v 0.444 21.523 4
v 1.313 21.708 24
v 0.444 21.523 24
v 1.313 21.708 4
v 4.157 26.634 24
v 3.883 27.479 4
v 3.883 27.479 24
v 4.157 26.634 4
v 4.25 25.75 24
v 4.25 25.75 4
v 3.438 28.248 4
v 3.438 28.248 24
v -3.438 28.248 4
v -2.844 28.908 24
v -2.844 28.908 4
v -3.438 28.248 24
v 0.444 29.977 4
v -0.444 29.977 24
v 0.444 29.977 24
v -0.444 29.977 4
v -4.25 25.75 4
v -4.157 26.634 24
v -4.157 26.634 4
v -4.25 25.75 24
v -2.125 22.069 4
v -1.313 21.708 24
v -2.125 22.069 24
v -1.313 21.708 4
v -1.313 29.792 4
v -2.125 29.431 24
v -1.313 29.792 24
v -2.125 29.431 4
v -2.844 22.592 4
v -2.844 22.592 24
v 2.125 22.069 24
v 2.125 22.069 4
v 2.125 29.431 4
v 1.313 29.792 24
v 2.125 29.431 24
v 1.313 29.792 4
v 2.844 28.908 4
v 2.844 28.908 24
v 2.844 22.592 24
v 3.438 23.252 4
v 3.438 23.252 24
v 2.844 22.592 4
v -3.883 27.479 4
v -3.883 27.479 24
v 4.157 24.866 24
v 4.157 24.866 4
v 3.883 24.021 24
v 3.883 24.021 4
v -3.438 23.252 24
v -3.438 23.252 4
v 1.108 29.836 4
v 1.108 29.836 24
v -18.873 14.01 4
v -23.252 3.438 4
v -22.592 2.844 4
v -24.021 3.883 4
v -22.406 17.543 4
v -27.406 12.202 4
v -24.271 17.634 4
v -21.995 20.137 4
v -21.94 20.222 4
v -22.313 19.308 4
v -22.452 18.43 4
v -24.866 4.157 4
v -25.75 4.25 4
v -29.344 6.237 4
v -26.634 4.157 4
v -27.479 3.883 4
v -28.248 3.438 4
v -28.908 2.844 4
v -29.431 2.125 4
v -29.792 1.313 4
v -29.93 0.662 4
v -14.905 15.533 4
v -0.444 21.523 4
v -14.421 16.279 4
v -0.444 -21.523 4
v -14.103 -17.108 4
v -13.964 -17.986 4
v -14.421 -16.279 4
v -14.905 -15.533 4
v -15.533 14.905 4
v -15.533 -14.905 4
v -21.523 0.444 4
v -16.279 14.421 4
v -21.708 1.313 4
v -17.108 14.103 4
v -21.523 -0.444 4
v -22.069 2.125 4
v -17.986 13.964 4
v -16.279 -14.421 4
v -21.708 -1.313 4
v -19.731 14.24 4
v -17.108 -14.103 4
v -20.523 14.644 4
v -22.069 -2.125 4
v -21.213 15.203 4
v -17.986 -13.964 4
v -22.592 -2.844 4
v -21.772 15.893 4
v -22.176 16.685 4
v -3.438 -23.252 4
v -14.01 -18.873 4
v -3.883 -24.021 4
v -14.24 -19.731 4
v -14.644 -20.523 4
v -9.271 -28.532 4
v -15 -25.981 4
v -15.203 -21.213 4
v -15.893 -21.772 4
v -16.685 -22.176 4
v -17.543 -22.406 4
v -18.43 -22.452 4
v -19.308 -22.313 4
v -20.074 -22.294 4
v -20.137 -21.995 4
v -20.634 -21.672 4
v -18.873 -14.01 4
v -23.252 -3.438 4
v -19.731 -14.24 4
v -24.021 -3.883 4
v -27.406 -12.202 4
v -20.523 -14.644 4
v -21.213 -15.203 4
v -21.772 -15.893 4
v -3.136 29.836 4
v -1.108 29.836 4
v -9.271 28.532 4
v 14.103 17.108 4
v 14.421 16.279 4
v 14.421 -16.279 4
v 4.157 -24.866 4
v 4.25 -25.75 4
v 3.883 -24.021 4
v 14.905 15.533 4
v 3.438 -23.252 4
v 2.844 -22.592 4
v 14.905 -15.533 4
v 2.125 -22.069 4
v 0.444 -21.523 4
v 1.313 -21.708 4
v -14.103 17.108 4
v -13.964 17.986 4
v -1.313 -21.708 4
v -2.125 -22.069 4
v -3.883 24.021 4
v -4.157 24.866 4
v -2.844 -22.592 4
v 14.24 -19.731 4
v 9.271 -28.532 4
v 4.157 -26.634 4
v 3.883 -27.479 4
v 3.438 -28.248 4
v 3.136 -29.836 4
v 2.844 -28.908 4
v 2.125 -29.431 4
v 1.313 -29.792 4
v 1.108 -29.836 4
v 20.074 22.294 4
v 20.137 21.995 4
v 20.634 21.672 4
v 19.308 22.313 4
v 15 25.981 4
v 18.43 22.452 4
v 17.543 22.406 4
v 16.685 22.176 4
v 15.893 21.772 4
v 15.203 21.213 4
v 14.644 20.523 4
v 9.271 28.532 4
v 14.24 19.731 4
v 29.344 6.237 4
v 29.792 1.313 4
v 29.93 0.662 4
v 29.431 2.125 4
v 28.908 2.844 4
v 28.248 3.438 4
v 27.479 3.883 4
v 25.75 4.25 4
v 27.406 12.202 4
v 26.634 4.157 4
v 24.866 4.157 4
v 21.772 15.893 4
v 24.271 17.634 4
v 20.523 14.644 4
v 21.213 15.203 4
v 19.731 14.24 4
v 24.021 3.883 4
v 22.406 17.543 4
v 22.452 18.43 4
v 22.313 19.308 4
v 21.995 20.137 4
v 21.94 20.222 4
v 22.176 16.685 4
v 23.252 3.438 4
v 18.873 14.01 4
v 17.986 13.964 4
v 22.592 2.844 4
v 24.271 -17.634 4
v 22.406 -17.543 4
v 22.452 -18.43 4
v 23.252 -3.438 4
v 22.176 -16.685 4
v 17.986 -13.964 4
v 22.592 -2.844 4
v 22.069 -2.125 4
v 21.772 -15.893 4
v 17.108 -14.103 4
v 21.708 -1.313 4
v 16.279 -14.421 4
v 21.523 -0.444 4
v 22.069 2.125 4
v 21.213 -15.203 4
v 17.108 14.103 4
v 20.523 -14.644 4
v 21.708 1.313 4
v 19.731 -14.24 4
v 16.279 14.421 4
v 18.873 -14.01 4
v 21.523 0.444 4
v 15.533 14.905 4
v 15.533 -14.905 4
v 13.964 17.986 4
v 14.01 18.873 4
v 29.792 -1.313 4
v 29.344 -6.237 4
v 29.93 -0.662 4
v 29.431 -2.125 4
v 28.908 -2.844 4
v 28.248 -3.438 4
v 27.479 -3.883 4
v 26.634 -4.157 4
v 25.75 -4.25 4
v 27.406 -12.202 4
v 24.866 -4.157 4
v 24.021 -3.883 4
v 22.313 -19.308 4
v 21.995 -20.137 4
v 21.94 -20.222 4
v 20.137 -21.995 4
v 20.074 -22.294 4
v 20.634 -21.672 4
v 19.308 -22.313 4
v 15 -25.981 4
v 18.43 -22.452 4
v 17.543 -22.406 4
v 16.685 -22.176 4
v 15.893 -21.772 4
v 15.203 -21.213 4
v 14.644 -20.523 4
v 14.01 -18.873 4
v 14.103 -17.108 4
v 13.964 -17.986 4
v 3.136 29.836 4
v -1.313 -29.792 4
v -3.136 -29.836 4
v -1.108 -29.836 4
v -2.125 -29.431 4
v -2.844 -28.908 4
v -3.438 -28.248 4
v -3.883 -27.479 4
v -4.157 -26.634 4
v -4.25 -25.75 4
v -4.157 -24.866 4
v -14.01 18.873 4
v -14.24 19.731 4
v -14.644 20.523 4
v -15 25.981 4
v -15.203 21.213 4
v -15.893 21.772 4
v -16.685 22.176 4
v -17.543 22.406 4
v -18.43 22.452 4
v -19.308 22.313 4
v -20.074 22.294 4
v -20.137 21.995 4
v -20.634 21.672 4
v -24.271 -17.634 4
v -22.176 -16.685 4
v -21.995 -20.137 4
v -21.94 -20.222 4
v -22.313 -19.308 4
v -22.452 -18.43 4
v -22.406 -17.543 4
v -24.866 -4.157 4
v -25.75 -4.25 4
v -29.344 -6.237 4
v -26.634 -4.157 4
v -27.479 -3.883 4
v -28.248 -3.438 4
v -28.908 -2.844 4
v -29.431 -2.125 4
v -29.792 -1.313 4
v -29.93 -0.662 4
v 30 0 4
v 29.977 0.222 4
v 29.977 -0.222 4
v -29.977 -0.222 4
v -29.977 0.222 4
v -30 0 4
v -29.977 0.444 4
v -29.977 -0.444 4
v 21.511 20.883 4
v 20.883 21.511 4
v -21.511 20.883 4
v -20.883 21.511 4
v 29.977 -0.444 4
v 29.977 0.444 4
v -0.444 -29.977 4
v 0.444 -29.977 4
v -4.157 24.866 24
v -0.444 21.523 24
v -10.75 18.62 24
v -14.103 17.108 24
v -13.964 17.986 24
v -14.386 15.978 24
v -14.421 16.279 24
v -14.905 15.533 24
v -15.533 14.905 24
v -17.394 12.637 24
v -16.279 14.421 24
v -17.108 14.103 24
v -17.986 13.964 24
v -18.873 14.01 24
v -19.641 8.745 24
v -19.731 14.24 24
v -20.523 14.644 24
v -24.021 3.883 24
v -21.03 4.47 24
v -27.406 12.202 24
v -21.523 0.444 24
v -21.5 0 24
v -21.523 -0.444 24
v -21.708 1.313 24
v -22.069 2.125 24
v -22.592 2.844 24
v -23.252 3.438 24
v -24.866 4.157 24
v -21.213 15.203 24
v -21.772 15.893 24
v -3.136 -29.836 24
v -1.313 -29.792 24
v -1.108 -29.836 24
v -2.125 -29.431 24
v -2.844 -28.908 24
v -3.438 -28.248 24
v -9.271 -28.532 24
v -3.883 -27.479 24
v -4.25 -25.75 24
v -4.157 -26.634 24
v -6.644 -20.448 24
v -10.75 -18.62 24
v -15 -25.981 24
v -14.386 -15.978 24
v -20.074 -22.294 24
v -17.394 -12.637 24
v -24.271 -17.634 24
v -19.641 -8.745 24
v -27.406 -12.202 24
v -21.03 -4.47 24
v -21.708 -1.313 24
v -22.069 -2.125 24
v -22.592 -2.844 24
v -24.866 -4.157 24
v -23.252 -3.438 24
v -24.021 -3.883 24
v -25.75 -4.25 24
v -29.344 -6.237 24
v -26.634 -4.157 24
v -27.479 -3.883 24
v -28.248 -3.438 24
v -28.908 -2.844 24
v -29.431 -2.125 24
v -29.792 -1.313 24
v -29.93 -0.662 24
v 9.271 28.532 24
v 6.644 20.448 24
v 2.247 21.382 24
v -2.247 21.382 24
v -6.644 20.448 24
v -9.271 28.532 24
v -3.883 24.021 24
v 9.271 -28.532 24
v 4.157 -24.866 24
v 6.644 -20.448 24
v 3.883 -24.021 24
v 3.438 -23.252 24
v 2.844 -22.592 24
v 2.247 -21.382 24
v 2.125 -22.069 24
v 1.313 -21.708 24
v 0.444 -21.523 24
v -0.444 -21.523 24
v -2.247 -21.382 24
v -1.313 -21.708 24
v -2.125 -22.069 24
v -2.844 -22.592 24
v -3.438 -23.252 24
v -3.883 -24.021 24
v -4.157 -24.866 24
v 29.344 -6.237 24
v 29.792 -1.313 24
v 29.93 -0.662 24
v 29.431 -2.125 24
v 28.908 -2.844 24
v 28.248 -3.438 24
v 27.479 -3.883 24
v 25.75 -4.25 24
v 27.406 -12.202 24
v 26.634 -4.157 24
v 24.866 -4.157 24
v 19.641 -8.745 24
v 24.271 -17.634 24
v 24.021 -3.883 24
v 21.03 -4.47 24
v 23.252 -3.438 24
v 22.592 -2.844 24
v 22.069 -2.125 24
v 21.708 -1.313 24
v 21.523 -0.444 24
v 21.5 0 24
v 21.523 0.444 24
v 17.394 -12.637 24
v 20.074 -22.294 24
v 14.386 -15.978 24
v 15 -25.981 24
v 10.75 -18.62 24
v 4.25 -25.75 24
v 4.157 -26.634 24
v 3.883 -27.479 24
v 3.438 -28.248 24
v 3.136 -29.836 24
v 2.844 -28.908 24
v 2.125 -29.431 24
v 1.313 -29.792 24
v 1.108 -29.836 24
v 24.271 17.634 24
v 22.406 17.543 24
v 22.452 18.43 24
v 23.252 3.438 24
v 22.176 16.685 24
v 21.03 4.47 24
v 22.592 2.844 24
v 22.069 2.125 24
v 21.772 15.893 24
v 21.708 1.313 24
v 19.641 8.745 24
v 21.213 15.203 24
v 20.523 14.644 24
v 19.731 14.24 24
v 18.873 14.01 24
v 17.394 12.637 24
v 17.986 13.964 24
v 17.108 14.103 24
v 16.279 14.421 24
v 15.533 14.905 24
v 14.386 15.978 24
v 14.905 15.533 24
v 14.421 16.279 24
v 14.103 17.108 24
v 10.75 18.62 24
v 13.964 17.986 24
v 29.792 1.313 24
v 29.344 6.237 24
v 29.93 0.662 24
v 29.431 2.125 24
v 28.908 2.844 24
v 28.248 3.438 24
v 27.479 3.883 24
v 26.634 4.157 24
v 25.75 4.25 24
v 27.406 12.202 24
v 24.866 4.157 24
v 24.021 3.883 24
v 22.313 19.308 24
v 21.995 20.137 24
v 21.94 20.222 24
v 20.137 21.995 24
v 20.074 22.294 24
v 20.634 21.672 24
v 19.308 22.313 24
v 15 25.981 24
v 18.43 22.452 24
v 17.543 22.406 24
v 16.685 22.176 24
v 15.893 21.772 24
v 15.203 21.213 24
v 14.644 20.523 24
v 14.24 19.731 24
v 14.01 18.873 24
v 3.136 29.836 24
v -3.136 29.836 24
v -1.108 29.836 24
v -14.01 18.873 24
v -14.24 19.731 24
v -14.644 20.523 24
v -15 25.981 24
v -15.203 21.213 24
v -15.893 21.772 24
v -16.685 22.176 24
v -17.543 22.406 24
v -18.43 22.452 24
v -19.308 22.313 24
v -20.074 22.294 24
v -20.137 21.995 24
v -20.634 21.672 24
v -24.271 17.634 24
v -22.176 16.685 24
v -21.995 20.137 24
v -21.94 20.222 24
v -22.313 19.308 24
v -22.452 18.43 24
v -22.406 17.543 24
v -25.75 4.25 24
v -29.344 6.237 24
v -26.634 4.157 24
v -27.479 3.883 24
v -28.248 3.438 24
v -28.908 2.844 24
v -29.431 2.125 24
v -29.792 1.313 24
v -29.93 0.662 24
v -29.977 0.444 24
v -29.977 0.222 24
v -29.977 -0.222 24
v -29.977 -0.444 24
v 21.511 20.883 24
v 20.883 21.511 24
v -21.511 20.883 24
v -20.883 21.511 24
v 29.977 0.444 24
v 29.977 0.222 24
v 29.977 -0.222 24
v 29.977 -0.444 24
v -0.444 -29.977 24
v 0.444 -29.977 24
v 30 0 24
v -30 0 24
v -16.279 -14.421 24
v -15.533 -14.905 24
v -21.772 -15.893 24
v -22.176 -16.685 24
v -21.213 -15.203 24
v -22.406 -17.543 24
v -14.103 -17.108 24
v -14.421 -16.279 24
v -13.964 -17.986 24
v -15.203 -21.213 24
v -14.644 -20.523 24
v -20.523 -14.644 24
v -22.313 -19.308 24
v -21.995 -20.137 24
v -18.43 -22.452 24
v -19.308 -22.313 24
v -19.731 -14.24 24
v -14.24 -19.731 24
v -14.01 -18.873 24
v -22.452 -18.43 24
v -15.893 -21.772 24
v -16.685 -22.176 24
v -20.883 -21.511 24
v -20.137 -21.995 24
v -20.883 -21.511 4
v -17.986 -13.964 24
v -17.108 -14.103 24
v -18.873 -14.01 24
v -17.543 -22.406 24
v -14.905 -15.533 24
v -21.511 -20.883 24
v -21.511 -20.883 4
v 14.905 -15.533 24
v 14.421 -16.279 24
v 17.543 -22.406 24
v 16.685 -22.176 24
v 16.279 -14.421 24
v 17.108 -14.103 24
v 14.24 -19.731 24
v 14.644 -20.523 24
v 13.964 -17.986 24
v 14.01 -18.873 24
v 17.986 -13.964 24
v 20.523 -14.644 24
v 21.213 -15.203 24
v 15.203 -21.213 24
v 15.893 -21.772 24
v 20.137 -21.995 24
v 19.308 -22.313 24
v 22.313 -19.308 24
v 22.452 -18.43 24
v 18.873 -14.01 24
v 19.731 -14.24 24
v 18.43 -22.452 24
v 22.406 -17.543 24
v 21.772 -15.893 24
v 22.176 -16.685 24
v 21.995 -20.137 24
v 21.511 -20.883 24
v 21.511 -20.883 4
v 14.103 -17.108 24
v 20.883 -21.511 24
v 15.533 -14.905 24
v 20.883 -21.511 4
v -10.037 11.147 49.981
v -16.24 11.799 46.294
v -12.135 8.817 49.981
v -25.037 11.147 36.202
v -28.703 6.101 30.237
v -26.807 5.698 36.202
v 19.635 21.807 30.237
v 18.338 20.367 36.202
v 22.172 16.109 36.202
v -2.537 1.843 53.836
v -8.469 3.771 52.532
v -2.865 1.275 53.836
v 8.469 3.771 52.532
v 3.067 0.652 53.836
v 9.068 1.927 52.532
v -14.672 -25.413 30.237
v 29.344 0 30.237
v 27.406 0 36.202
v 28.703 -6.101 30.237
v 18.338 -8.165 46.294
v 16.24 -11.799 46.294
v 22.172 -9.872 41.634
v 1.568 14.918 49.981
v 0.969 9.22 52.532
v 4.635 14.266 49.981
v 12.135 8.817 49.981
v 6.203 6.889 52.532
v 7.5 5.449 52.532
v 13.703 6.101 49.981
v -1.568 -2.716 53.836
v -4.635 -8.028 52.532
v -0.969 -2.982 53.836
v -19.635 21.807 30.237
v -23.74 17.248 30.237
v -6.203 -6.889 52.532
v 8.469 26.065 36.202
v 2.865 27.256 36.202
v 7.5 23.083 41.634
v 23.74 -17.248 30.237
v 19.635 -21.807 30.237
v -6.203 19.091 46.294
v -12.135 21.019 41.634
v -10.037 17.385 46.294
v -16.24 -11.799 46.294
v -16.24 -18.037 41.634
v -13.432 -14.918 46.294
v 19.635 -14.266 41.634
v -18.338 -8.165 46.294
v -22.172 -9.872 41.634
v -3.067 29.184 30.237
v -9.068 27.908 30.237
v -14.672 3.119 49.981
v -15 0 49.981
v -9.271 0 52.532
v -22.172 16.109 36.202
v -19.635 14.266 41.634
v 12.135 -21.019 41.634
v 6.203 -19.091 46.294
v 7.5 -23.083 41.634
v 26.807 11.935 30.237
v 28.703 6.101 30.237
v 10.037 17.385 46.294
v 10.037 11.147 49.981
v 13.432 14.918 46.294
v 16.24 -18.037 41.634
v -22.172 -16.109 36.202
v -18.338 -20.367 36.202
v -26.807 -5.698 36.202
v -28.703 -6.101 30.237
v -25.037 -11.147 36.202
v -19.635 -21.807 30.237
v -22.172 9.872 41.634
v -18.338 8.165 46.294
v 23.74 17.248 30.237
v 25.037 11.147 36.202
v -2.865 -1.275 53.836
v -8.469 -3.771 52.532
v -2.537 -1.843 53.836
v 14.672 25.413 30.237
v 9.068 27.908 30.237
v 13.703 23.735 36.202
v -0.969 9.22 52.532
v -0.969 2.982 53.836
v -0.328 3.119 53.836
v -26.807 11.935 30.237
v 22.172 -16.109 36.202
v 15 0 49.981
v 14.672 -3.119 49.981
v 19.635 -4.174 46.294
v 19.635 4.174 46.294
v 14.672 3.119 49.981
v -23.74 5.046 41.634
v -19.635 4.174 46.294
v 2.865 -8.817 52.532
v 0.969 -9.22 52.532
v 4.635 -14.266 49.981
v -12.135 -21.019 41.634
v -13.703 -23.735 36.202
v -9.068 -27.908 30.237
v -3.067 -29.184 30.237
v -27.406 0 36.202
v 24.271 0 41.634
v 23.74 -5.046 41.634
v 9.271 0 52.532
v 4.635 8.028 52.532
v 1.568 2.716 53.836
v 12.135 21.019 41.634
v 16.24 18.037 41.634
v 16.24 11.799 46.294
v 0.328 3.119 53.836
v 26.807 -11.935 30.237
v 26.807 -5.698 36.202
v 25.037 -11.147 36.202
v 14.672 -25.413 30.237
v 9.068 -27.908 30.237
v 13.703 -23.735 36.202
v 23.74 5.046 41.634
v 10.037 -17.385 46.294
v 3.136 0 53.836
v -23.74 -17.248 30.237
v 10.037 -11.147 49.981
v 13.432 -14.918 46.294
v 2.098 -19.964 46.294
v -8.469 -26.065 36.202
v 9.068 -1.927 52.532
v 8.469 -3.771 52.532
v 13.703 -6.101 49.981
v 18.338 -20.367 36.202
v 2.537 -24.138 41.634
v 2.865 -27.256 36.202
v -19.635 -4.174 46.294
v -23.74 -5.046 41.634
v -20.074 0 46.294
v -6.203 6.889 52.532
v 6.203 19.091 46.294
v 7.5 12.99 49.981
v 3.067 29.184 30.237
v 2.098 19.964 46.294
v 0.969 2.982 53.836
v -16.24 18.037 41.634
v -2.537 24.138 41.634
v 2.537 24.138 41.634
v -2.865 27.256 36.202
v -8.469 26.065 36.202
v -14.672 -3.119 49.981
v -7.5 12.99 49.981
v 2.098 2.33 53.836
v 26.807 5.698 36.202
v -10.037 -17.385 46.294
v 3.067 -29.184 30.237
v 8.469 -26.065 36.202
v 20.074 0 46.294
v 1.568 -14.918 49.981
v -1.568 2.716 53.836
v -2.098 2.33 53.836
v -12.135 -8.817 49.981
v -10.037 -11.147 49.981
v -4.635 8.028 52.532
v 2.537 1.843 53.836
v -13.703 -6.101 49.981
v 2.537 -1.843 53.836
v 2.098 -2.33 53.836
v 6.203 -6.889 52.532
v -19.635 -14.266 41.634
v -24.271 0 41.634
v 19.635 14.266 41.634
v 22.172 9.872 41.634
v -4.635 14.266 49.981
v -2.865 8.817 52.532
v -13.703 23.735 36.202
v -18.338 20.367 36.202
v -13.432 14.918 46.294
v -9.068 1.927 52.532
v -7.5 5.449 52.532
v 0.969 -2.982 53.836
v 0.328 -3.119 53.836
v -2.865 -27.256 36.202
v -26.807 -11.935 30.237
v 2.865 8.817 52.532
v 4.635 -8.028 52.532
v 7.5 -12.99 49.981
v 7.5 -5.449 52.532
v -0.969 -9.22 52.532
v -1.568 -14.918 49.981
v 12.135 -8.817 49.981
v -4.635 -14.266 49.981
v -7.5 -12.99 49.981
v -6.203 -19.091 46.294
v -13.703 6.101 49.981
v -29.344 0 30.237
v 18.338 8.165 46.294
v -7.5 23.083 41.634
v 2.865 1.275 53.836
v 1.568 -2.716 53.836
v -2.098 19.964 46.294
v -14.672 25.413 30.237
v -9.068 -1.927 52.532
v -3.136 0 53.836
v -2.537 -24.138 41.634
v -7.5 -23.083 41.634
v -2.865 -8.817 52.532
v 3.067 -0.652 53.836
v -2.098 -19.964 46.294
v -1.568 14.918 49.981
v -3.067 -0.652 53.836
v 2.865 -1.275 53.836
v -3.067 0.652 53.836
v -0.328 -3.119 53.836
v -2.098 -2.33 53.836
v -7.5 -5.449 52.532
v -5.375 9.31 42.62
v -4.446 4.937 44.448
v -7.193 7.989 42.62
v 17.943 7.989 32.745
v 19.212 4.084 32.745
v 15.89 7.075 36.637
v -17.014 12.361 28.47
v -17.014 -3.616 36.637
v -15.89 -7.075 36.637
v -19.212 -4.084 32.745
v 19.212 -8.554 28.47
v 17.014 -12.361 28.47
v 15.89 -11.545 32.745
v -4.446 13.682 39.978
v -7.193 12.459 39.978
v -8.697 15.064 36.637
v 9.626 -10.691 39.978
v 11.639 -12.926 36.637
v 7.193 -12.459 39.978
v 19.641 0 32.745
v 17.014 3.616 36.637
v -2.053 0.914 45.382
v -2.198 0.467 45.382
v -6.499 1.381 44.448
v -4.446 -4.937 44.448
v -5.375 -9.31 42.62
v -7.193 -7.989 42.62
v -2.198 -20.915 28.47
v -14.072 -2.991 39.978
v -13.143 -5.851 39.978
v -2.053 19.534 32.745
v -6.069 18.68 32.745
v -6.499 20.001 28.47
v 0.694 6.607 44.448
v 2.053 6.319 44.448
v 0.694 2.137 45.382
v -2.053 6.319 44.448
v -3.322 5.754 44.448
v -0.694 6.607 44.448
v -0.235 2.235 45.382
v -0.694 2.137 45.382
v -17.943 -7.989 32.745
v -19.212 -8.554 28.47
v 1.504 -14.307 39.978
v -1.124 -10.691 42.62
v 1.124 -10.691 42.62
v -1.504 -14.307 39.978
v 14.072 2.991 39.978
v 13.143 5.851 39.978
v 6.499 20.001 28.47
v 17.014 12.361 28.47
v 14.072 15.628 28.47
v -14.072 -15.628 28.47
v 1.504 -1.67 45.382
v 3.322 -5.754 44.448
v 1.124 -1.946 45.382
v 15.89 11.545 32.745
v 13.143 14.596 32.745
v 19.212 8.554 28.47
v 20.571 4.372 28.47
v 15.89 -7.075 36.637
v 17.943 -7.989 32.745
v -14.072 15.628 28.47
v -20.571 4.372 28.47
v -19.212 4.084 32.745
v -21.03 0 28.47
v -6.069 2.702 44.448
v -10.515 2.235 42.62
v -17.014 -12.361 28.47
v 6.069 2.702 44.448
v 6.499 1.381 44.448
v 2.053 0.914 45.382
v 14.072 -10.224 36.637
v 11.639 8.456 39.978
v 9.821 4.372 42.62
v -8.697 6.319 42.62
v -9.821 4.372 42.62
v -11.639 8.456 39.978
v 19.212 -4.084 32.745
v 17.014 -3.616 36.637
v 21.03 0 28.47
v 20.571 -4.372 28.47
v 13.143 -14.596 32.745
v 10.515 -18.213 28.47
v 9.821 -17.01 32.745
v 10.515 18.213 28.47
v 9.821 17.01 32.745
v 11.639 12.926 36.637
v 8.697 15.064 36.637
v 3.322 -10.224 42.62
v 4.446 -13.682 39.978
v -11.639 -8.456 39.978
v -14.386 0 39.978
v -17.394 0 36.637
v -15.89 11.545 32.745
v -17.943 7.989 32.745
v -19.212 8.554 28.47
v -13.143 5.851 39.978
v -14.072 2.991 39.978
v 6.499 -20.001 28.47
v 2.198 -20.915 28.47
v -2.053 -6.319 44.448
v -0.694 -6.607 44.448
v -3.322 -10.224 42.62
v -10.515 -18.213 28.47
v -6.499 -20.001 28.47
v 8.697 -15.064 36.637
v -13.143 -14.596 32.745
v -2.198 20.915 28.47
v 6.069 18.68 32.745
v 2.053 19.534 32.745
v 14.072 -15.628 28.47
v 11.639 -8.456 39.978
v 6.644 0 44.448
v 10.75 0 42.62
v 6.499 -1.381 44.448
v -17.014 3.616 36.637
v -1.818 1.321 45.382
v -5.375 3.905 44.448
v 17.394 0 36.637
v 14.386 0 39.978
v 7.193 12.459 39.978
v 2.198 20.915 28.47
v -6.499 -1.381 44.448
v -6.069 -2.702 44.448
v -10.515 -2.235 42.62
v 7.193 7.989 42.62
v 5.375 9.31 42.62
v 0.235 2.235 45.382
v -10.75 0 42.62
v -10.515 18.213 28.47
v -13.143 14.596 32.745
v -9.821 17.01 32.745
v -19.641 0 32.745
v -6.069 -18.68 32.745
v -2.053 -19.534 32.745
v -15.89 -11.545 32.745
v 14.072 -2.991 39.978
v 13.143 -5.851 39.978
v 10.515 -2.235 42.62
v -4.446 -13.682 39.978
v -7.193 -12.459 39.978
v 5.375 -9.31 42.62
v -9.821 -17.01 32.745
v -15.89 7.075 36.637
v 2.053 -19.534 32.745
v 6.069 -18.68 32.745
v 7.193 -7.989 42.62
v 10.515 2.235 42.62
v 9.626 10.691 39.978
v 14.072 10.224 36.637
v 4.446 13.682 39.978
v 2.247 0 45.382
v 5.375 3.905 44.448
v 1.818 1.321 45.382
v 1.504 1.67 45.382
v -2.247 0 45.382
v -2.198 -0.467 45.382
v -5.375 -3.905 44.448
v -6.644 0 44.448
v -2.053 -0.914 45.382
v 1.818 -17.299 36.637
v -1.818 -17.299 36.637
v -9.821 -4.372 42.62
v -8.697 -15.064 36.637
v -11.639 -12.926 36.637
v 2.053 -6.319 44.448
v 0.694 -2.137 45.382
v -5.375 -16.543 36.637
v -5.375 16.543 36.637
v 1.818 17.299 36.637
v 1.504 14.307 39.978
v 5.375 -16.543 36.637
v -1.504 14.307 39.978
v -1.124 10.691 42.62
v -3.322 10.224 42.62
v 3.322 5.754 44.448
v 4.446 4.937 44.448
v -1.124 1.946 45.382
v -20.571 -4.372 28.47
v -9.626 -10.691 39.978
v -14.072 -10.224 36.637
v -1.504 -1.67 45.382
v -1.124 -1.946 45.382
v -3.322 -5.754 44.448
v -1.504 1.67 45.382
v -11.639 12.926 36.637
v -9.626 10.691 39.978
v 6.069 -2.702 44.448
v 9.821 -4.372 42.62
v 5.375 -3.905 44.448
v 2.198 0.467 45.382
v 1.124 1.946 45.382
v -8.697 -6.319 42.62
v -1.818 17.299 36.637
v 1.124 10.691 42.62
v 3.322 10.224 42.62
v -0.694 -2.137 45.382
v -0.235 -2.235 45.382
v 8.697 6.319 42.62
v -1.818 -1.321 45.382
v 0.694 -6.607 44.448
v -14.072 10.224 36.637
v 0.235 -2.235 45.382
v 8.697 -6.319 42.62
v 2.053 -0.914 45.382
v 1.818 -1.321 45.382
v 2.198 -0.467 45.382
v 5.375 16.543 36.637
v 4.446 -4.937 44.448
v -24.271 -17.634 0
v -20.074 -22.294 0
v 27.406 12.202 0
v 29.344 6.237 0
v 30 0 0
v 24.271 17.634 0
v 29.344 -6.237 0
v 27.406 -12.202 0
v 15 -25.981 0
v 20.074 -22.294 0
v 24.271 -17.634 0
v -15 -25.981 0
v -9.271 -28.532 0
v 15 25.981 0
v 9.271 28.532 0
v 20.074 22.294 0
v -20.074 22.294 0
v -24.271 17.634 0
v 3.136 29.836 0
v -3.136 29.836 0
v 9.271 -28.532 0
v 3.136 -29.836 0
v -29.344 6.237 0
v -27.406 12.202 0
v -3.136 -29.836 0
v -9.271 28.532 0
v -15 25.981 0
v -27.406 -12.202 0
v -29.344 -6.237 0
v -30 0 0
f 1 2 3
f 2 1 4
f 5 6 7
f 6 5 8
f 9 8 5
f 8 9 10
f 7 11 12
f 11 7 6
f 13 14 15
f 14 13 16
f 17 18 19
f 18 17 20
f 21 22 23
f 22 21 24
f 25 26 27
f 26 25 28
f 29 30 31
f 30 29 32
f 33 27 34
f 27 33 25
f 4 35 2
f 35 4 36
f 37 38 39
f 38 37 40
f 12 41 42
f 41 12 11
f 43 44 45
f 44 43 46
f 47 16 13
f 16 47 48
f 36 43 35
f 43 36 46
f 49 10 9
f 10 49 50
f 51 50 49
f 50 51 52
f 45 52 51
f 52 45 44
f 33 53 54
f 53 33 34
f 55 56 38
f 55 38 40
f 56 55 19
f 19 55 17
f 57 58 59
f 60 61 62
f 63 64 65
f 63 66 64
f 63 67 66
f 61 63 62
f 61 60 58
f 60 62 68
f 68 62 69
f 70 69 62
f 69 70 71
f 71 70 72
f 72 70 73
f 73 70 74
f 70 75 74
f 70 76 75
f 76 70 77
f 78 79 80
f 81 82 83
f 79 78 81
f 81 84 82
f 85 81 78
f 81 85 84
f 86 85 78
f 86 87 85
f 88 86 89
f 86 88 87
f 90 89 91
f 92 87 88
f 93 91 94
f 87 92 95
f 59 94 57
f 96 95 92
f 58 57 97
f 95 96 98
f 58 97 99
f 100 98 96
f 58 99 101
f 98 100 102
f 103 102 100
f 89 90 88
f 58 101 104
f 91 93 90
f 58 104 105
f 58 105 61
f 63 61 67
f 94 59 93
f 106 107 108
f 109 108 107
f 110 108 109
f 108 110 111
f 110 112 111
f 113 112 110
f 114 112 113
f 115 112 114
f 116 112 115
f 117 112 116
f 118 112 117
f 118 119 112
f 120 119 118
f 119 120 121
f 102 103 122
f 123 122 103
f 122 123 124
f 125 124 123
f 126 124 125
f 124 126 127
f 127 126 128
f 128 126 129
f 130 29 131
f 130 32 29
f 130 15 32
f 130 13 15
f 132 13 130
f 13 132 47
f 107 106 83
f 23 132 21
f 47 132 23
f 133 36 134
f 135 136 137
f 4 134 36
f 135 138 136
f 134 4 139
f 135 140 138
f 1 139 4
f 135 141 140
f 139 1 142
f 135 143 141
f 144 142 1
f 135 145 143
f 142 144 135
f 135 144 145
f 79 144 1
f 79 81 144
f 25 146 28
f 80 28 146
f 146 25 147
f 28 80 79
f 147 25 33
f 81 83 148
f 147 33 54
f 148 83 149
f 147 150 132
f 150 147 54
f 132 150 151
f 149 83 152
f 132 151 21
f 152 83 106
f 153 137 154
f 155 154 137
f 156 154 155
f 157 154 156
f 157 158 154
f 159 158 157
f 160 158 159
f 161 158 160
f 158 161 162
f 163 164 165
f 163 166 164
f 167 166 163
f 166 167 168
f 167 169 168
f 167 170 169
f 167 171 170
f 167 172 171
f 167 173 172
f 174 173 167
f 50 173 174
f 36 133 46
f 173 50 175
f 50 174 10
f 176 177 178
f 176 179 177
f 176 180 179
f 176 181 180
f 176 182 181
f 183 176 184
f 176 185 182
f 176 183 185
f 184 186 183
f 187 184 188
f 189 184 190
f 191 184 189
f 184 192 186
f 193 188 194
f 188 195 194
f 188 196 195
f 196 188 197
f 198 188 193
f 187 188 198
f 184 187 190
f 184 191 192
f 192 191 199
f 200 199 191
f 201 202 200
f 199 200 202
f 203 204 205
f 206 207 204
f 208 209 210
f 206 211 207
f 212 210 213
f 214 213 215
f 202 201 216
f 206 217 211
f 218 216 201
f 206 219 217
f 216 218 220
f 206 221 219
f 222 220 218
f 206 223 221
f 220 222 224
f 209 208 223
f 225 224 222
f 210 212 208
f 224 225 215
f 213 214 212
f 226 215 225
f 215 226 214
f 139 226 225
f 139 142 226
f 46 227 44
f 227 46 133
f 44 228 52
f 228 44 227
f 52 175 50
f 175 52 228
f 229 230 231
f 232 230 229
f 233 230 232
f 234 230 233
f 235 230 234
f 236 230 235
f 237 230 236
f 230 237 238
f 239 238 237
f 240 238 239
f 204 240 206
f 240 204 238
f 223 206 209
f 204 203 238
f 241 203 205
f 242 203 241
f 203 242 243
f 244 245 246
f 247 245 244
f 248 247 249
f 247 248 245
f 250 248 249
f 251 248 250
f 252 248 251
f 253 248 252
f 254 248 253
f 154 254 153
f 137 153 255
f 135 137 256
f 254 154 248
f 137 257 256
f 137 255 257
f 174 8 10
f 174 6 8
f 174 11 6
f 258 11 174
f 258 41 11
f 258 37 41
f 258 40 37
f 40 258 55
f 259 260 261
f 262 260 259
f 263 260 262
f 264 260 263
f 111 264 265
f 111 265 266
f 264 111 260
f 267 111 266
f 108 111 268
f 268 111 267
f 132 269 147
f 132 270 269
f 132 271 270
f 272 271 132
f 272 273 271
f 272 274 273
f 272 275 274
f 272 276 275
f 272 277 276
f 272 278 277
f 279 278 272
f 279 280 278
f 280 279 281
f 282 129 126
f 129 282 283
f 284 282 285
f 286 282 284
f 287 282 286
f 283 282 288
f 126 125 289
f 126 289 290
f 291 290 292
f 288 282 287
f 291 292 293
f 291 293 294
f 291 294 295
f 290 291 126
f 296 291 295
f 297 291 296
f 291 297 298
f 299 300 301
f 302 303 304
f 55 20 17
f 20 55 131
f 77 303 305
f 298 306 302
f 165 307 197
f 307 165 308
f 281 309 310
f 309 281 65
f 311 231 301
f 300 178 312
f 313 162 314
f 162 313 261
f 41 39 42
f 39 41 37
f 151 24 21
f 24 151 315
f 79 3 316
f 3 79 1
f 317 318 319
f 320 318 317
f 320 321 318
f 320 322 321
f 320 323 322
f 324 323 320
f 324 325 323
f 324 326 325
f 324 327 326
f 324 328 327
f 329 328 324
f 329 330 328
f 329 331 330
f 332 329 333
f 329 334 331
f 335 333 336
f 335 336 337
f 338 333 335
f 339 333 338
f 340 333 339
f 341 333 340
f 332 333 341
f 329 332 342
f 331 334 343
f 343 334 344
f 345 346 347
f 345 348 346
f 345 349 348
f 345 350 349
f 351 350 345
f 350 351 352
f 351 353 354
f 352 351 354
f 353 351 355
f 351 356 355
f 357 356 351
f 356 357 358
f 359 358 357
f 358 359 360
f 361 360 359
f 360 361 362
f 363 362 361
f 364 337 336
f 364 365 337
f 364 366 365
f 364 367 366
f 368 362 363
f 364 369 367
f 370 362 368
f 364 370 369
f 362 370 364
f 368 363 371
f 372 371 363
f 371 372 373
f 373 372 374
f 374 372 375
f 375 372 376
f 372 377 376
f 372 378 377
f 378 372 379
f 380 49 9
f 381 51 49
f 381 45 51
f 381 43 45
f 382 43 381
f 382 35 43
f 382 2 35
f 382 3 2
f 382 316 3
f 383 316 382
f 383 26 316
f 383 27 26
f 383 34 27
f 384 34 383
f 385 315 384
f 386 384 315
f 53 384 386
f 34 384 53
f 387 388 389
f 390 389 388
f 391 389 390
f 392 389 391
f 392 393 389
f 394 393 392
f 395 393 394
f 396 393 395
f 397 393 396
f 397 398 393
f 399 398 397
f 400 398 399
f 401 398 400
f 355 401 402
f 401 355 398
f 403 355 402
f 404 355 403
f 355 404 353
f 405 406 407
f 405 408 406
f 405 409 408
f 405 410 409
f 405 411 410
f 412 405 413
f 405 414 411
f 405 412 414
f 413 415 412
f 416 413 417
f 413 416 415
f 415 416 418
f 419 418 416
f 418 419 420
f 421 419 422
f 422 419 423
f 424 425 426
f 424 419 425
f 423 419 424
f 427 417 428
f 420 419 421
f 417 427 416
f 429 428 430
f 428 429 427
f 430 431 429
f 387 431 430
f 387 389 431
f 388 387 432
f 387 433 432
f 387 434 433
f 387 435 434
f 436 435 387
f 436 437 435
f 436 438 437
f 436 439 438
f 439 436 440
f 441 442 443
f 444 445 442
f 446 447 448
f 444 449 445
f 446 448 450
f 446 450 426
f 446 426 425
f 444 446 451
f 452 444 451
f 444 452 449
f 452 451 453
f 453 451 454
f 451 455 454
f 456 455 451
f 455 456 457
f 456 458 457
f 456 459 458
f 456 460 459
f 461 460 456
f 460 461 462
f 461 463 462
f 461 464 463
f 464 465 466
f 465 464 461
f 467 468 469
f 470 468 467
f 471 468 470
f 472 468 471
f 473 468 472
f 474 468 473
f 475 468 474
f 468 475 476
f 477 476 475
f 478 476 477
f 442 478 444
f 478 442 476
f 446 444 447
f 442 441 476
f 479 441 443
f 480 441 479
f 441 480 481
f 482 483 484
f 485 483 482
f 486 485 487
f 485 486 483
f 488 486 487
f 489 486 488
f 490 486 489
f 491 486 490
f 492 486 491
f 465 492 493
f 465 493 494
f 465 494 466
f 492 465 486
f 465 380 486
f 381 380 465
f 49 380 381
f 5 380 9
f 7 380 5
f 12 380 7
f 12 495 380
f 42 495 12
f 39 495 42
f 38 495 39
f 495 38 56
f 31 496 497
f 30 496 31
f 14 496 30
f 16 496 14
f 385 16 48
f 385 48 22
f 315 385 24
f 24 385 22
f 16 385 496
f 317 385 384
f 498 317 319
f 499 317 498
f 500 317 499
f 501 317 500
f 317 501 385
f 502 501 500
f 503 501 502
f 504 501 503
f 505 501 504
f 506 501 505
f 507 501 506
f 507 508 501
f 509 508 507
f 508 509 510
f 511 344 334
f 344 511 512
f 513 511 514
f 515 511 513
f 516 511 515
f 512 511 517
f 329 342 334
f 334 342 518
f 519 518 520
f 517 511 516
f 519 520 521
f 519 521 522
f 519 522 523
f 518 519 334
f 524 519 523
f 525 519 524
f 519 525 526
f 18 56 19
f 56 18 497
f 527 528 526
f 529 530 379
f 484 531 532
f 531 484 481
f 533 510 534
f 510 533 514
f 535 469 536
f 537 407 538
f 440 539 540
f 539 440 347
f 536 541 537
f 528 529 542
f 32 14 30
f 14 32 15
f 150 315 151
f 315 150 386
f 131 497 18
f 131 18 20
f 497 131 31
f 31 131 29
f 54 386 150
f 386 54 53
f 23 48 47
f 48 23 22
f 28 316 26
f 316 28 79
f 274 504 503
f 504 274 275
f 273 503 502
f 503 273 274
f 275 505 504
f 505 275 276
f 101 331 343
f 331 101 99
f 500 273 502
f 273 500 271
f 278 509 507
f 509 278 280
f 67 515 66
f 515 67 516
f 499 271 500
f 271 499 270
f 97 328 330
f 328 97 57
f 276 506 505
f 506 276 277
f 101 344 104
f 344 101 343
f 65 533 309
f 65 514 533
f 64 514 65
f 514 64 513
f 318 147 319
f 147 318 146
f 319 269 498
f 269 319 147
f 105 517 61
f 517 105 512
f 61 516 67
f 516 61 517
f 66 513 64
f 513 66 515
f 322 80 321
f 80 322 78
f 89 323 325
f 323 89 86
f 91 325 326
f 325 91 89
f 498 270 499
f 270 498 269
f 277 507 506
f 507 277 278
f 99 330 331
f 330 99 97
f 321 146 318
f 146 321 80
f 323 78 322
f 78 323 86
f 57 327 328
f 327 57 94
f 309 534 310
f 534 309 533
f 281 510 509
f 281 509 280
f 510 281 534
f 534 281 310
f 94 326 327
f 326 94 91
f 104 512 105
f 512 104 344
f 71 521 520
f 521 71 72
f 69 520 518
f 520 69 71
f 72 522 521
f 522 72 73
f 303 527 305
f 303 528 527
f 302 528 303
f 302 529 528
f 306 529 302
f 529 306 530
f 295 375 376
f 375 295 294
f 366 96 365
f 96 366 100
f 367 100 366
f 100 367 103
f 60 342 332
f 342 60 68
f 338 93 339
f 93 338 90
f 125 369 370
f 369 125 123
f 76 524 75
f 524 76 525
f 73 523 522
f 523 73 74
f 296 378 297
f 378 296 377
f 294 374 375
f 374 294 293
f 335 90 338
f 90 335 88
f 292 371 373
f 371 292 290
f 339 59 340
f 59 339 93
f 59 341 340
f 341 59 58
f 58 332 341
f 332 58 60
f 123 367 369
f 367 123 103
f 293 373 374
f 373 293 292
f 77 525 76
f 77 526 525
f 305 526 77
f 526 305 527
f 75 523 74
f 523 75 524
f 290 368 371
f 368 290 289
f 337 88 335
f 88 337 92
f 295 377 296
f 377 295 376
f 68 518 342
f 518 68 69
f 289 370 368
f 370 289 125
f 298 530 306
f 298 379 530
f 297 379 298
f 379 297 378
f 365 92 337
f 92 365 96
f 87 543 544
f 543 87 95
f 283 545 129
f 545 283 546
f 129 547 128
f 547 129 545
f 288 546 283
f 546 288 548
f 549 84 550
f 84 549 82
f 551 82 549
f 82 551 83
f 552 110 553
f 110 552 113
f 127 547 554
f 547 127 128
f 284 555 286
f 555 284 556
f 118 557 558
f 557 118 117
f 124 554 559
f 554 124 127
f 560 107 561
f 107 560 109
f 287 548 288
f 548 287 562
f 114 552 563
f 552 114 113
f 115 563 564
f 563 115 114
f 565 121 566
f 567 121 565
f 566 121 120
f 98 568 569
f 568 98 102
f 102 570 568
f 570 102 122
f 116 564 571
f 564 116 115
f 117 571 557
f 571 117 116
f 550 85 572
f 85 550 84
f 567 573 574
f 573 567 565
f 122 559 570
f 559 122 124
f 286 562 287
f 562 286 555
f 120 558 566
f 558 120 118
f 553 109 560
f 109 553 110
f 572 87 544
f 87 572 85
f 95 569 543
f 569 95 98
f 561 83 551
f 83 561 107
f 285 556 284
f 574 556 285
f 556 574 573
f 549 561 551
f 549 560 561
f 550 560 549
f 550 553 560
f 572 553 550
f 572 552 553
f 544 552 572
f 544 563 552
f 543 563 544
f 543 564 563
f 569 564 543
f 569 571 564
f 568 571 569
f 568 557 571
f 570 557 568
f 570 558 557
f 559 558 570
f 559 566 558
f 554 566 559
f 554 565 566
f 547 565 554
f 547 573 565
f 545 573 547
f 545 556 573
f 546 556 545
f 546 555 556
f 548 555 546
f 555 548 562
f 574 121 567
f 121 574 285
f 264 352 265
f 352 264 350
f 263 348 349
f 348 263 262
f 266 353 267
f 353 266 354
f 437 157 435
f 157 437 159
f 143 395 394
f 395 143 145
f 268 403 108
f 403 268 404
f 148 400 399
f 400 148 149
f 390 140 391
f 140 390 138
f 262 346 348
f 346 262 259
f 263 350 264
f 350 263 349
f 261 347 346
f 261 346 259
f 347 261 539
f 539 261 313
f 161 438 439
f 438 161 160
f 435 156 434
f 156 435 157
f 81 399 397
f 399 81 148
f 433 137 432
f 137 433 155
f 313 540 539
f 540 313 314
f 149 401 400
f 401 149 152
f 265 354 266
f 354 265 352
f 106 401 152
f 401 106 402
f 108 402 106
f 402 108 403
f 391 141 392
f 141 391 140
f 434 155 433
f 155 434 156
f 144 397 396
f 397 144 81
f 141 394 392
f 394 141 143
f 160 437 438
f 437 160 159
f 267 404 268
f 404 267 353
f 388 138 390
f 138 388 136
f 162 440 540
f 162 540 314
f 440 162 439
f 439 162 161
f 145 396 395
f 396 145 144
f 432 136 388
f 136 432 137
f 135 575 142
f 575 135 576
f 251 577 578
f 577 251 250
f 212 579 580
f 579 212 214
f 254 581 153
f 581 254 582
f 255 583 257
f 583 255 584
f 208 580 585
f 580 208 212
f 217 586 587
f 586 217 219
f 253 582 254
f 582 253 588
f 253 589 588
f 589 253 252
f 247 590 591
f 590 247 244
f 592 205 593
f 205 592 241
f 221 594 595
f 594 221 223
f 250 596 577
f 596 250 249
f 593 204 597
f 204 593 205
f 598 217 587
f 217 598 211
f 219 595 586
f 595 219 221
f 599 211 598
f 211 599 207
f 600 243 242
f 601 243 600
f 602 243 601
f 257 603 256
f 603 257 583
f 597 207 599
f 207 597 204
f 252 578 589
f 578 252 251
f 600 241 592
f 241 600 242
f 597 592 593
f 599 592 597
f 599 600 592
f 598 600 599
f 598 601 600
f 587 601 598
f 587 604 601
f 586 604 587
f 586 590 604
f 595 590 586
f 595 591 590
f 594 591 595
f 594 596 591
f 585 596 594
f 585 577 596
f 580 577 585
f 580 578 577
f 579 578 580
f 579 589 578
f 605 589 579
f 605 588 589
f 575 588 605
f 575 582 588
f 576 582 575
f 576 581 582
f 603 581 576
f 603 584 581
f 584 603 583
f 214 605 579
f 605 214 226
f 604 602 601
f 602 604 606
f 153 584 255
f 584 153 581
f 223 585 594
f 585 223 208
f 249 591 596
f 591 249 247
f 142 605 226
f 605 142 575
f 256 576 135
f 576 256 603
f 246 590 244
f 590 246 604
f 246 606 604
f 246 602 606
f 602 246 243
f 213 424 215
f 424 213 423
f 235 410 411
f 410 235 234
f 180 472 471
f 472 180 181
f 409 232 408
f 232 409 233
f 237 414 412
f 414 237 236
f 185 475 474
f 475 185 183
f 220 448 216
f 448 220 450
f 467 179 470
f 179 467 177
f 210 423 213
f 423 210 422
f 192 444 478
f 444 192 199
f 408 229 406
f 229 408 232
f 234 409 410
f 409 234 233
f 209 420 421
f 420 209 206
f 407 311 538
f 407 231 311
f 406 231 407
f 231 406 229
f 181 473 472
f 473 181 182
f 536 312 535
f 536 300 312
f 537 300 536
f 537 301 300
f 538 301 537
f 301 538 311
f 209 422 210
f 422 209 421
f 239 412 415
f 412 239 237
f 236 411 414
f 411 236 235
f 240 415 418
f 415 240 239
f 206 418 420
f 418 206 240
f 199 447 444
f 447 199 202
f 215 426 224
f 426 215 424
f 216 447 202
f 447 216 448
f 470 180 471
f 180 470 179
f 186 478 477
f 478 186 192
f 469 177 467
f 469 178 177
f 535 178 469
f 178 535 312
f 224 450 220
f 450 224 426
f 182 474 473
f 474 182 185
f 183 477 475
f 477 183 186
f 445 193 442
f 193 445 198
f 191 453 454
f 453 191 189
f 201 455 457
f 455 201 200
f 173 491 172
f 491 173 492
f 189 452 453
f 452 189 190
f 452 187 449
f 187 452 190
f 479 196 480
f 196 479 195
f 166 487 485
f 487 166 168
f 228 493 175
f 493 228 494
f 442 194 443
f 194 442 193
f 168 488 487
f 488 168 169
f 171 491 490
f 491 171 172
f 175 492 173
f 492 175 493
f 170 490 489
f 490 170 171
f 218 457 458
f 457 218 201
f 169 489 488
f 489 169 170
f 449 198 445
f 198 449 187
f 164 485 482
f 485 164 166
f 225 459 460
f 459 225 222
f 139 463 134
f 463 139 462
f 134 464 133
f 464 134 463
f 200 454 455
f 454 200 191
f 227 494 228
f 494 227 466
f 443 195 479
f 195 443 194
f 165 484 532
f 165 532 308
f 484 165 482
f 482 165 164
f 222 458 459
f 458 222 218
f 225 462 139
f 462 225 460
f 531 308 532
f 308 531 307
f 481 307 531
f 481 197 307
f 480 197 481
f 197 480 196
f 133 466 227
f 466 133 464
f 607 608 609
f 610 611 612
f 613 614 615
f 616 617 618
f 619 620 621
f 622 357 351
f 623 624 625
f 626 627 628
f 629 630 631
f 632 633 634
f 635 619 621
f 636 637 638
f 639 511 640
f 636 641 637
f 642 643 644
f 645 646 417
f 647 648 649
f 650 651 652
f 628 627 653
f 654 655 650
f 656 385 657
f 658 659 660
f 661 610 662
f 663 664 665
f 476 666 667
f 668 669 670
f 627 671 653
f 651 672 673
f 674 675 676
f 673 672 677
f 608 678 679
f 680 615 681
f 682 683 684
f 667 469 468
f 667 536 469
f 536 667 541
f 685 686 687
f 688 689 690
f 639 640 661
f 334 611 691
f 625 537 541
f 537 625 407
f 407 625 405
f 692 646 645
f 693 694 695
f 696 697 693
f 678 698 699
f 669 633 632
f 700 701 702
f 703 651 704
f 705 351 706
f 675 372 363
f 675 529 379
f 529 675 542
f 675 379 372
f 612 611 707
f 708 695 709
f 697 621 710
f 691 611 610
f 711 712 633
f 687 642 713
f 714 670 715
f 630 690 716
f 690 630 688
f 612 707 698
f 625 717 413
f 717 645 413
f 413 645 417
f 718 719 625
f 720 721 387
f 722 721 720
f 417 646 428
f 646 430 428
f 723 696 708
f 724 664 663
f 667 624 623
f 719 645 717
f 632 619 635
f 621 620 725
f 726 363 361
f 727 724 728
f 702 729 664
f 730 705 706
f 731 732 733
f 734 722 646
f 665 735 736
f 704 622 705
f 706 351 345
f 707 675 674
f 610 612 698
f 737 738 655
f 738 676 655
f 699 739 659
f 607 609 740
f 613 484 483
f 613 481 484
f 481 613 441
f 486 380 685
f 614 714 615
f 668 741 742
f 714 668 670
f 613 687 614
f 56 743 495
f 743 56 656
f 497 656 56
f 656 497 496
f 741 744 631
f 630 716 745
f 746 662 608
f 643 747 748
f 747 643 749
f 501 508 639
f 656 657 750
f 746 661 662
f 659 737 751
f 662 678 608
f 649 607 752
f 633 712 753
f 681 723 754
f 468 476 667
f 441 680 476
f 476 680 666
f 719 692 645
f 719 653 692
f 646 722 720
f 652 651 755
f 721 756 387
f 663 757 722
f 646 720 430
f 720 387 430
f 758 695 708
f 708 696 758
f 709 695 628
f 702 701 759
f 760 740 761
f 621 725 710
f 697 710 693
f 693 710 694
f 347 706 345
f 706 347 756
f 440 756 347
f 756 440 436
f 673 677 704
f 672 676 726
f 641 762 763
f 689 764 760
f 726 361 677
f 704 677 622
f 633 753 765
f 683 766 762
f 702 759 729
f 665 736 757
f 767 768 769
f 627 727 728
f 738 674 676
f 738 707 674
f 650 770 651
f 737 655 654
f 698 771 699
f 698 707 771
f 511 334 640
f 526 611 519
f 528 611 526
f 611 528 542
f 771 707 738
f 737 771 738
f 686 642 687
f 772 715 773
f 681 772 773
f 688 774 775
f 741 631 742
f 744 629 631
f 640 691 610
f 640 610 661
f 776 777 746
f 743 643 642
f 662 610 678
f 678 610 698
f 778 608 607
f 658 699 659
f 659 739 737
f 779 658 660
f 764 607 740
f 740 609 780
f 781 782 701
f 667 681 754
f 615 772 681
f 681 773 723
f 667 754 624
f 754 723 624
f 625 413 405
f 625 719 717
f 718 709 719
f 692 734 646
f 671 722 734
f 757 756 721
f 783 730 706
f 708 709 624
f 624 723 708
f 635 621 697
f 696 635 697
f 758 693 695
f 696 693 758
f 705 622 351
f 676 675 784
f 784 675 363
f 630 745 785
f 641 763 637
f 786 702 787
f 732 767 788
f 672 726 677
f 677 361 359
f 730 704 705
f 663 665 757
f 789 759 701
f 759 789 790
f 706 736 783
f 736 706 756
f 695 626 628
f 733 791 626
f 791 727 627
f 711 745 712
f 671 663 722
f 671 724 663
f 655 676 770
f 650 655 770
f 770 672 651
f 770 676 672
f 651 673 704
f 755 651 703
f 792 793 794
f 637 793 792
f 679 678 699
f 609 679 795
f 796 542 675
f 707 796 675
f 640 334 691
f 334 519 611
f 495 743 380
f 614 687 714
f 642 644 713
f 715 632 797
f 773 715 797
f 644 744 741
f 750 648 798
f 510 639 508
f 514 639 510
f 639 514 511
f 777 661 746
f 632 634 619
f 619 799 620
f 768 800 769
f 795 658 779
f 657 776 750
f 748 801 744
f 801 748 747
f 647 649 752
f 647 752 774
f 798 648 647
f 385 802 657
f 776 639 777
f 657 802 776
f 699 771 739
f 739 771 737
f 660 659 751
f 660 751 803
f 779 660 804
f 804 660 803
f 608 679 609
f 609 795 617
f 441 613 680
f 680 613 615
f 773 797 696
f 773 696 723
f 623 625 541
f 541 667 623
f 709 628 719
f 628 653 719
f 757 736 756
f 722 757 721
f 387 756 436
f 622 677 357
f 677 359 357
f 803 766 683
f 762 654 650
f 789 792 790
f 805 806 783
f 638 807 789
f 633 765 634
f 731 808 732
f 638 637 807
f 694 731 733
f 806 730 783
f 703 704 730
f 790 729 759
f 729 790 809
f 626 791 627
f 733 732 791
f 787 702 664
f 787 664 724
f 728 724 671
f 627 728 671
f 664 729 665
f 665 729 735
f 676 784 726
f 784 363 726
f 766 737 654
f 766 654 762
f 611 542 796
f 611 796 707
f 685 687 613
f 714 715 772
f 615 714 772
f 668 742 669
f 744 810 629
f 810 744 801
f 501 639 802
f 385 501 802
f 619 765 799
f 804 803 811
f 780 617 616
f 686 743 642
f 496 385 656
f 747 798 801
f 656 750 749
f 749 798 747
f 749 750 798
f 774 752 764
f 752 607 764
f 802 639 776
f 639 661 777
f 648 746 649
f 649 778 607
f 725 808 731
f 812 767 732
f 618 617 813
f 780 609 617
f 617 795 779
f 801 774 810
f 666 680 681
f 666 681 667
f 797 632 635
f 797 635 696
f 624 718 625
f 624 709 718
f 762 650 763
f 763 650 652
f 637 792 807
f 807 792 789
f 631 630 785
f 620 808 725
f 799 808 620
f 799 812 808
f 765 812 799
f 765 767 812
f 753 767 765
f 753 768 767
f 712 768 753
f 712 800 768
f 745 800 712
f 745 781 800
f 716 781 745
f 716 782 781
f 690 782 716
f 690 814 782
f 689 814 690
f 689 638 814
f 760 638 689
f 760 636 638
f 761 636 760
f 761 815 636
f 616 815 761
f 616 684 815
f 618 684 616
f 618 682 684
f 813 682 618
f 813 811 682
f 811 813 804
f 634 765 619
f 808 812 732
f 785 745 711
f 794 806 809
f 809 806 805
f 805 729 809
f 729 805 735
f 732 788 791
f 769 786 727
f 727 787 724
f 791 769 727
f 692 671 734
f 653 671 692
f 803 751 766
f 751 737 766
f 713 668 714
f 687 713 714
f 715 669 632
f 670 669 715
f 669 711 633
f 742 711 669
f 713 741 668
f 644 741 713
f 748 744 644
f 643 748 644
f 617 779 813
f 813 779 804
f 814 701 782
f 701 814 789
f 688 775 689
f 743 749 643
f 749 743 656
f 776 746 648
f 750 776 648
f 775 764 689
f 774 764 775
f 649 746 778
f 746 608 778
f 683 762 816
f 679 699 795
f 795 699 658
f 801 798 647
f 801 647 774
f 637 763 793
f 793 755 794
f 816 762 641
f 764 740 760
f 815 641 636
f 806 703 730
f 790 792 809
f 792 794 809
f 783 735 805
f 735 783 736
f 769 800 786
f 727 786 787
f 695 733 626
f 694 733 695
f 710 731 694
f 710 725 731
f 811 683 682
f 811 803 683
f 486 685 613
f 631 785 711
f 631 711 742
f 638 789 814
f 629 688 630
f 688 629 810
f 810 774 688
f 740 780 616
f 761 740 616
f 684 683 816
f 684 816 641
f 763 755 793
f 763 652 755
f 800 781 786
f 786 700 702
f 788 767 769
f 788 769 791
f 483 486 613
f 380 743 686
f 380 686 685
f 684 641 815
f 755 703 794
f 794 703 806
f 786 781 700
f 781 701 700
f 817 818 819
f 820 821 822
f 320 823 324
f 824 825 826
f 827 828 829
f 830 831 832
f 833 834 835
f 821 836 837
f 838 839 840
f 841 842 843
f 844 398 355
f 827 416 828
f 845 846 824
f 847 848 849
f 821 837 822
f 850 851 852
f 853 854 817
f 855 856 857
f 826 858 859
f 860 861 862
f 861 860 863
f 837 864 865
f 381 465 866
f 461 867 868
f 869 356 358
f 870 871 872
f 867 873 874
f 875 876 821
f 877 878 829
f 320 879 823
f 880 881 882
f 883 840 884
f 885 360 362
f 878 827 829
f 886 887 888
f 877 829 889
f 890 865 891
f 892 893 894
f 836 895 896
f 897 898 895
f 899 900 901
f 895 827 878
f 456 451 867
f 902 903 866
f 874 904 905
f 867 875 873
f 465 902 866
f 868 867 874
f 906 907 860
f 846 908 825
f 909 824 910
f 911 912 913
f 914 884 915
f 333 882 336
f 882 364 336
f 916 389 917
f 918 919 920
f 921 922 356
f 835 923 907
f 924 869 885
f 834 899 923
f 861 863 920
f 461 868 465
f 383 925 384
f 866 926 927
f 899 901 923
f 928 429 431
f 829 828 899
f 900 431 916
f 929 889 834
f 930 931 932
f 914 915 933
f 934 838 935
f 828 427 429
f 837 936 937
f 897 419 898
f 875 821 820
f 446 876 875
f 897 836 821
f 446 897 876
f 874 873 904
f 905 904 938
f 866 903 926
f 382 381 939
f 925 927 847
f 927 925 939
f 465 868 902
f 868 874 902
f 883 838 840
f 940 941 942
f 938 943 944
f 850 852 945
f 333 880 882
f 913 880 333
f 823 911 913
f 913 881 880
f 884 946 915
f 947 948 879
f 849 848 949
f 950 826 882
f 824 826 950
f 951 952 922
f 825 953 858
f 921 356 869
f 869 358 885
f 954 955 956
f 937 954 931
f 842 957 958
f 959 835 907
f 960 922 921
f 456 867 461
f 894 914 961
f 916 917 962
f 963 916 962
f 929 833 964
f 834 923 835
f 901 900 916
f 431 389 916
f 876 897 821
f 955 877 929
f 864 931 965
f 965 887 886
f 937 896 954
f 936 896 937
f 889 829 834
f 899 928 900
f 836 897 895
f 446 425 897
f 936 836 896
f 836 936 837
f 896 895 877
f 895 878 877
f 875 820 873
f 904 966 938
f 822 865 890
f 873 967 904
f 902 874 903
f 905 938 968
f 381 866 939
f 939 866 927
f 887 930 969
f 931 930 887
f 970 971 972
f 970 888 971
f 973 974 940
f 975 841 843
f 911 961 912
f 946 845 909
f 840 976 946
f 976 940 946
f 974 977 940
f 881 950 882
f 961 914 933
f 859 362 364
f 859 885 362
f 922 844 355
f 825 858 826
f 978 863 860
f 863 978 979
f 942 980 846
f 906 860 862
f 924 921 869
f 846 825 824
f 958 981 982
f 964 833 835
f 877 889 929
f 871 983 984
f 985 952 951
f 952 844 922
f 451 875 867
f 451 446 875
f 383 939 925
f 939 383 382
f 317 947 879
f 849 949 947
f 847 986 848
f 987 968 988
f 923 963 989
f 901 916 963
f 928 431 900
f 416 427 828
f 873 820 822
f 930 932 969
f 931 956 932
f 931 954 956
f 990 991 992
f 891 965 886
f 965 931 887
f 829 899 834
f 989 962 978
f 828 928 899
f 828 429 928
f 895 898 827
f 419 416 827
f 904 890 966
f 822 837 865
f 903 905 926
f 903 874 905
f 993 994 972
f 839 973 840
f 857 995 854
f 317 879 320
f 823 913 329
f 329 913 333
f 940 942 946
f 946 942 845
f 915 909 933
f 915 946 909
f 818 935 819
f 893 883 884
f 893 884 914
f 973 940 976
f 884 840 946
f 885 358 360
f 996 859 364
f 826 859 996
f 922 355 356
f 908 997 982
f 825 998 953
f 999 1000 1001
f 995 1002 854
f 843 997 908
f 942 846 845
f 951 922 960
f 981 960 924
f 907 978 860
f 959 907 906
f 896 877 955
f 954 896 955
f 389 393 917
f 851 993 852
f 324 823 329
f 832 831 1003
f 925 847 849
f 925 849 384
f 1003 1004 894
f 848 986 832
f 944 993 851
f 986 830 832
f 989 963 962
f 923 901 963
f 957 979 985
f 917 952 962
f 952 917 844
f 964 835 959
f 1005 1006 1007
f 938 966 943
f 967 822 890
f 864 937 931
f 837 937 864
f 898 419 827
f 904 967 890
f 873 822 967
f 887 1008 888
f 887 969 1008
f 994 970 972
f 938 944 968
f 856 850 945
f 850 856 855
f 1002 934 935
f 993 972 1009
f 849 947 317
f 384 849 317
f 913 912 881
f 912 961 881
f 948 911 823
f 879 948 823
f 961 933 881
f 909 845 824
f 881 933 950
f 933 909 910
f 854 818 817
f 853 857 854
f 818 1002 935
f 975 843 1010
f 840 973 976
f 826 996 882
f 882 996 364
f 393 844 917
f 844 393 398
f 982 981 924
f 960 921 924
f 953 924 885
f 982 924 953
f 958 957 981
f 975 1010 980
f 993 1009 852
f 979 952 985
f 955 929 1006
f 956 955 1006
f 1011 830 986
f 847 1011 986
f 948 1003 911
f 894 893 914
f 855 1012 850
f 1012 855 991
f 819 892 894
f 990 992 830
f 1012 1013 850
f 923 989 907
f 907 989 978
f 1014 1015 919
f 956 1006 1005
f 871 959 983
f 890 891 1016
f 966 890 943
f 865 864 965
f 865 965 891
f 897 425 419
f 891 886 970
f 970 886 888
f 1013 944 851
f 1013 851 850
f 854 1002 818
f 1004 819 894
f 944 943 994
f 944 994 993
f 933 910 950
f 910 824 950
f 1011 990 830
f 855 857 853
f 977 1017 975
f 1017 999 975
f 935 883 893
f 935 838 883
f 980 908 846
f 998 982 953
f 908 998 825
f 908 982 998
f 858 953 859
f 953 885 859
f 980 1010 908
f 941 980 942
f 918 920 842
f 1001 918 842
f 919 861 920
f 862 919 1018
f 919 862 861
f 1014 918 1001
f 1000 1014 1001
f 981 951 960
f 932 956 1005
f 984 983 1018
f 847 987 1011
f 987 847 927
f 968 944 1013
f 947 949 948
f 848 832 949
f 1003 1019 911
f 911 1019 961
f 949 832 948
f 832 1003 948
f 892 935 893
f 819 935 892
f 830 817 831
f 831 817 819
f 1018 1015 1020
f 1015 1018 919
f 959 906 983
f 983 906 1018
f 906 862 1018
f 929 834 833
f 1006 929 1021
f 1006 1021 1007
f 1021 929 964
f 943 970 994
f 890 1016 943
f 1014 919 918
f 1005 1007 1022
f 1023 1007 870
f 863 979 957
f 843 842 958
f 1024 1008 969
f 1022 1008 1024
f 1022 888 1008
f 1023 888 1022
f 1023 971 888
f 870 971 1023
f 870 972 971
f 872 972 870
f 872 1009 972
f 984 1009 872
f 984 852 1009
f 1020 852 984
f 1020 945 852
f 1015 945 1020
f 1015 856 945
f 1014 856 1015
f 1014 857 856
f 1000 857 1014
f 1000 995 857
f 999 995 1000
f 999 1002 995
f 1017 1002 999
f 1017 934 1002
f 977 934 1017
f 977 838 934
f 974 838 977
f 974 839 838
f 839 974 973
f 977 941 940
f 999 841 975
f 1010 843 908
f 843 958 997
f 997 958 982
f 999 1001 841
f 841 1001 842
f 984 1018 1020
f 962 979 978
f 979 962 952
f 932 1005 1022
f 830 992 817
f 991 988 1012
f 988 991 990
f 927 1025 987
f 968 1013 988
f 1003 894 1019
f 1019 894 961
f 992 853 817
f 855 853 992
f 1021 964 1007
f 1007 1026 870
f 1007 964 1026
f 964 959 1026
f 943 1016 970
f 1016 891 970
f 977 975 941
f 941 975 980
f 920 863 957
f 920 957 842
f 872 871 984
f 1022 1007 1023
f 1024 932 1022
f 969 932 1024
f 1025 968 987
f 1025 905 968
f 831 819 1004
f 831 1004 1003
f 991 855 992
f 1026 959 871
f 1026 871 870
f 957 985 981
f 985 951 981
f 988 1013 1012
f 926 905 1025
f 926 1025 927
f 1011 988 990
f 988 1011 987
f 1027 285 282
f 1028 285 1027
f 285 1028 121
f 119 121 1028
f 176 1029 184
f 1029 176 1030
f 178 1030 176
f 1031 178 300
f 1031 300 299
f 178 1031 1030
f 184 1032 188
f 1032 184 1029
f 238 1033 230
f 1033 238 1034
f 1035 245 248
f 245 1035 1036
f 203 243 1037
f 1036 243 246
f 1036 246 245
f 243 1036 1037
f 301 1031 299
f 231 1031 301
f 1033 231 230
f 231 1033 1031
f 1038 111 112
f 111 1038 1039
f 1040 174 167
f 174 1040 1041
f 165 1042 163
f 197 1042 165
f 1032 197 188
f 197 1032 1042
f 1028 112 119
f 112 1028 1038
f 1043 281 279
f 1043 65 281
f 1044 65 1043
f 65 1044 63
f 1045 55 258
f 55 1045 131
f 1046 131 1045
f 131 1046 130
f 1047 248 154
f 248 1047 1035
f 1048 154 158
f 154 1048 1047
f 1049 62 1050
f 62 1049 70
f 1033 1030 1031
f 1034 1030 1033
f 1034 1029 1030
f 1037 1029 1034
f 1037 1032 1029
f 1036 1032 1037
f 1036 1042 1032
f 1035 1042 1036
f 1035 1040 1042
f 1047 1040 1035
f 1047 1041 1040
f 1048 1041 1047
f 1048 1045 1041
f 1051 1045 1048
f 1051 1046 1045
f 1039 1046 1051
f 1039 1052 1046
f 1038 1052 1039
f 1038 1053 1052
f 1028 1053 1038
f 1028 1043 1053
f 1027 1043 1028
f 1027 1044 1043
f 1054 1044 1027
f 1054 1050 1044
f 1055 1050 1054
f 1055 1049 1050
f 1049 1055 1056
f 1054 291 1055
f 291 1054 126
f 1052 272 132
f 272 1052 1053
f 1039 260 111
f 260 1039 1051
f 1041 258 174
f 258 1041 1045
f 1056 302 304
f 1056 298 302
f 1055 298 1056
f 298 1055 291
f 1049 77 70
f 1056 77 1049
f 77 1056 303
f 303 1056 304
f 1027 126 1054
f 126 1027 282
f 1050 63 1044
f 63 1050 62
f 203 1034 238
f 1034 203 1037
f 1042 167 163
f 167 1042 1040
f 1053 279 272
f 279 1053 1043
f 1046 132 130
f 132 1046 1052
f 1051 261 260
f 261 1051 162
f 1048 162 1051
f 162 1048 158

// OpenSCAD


diameter=60; //[5:100]
hight=20;	//[0:100]
column_number=8; //[0:36]

$fn=30; 

base_hight=2+hight/10;
column_diameter=1+diameter/8;
radius=diameter/2;

translate([0,0,base_hight/2])
cylinder(h=base_hight, r=radius, center=true);

column_z=base_hight+hight/2;

for ( i = [0 : column_number-1] )
{
    rotate( i * 360 / column_number, [0, 0, 1])
    translate([0, (diameter-column_diameter)/2, base_hight+hight/2])
  		cylinder(h=hight, r=column_diameter/2, center=true);
}

cupola();


module cupola()
{
	translate([0,0,base_hight+hight])
	difference()
	{
	
		sphere(r=radius, center=true);
		sphere(r=radius-column_diameter, center=true);
		translate([0,0,-diameter/2])
		cube(diameter, center=true);
	}

}
